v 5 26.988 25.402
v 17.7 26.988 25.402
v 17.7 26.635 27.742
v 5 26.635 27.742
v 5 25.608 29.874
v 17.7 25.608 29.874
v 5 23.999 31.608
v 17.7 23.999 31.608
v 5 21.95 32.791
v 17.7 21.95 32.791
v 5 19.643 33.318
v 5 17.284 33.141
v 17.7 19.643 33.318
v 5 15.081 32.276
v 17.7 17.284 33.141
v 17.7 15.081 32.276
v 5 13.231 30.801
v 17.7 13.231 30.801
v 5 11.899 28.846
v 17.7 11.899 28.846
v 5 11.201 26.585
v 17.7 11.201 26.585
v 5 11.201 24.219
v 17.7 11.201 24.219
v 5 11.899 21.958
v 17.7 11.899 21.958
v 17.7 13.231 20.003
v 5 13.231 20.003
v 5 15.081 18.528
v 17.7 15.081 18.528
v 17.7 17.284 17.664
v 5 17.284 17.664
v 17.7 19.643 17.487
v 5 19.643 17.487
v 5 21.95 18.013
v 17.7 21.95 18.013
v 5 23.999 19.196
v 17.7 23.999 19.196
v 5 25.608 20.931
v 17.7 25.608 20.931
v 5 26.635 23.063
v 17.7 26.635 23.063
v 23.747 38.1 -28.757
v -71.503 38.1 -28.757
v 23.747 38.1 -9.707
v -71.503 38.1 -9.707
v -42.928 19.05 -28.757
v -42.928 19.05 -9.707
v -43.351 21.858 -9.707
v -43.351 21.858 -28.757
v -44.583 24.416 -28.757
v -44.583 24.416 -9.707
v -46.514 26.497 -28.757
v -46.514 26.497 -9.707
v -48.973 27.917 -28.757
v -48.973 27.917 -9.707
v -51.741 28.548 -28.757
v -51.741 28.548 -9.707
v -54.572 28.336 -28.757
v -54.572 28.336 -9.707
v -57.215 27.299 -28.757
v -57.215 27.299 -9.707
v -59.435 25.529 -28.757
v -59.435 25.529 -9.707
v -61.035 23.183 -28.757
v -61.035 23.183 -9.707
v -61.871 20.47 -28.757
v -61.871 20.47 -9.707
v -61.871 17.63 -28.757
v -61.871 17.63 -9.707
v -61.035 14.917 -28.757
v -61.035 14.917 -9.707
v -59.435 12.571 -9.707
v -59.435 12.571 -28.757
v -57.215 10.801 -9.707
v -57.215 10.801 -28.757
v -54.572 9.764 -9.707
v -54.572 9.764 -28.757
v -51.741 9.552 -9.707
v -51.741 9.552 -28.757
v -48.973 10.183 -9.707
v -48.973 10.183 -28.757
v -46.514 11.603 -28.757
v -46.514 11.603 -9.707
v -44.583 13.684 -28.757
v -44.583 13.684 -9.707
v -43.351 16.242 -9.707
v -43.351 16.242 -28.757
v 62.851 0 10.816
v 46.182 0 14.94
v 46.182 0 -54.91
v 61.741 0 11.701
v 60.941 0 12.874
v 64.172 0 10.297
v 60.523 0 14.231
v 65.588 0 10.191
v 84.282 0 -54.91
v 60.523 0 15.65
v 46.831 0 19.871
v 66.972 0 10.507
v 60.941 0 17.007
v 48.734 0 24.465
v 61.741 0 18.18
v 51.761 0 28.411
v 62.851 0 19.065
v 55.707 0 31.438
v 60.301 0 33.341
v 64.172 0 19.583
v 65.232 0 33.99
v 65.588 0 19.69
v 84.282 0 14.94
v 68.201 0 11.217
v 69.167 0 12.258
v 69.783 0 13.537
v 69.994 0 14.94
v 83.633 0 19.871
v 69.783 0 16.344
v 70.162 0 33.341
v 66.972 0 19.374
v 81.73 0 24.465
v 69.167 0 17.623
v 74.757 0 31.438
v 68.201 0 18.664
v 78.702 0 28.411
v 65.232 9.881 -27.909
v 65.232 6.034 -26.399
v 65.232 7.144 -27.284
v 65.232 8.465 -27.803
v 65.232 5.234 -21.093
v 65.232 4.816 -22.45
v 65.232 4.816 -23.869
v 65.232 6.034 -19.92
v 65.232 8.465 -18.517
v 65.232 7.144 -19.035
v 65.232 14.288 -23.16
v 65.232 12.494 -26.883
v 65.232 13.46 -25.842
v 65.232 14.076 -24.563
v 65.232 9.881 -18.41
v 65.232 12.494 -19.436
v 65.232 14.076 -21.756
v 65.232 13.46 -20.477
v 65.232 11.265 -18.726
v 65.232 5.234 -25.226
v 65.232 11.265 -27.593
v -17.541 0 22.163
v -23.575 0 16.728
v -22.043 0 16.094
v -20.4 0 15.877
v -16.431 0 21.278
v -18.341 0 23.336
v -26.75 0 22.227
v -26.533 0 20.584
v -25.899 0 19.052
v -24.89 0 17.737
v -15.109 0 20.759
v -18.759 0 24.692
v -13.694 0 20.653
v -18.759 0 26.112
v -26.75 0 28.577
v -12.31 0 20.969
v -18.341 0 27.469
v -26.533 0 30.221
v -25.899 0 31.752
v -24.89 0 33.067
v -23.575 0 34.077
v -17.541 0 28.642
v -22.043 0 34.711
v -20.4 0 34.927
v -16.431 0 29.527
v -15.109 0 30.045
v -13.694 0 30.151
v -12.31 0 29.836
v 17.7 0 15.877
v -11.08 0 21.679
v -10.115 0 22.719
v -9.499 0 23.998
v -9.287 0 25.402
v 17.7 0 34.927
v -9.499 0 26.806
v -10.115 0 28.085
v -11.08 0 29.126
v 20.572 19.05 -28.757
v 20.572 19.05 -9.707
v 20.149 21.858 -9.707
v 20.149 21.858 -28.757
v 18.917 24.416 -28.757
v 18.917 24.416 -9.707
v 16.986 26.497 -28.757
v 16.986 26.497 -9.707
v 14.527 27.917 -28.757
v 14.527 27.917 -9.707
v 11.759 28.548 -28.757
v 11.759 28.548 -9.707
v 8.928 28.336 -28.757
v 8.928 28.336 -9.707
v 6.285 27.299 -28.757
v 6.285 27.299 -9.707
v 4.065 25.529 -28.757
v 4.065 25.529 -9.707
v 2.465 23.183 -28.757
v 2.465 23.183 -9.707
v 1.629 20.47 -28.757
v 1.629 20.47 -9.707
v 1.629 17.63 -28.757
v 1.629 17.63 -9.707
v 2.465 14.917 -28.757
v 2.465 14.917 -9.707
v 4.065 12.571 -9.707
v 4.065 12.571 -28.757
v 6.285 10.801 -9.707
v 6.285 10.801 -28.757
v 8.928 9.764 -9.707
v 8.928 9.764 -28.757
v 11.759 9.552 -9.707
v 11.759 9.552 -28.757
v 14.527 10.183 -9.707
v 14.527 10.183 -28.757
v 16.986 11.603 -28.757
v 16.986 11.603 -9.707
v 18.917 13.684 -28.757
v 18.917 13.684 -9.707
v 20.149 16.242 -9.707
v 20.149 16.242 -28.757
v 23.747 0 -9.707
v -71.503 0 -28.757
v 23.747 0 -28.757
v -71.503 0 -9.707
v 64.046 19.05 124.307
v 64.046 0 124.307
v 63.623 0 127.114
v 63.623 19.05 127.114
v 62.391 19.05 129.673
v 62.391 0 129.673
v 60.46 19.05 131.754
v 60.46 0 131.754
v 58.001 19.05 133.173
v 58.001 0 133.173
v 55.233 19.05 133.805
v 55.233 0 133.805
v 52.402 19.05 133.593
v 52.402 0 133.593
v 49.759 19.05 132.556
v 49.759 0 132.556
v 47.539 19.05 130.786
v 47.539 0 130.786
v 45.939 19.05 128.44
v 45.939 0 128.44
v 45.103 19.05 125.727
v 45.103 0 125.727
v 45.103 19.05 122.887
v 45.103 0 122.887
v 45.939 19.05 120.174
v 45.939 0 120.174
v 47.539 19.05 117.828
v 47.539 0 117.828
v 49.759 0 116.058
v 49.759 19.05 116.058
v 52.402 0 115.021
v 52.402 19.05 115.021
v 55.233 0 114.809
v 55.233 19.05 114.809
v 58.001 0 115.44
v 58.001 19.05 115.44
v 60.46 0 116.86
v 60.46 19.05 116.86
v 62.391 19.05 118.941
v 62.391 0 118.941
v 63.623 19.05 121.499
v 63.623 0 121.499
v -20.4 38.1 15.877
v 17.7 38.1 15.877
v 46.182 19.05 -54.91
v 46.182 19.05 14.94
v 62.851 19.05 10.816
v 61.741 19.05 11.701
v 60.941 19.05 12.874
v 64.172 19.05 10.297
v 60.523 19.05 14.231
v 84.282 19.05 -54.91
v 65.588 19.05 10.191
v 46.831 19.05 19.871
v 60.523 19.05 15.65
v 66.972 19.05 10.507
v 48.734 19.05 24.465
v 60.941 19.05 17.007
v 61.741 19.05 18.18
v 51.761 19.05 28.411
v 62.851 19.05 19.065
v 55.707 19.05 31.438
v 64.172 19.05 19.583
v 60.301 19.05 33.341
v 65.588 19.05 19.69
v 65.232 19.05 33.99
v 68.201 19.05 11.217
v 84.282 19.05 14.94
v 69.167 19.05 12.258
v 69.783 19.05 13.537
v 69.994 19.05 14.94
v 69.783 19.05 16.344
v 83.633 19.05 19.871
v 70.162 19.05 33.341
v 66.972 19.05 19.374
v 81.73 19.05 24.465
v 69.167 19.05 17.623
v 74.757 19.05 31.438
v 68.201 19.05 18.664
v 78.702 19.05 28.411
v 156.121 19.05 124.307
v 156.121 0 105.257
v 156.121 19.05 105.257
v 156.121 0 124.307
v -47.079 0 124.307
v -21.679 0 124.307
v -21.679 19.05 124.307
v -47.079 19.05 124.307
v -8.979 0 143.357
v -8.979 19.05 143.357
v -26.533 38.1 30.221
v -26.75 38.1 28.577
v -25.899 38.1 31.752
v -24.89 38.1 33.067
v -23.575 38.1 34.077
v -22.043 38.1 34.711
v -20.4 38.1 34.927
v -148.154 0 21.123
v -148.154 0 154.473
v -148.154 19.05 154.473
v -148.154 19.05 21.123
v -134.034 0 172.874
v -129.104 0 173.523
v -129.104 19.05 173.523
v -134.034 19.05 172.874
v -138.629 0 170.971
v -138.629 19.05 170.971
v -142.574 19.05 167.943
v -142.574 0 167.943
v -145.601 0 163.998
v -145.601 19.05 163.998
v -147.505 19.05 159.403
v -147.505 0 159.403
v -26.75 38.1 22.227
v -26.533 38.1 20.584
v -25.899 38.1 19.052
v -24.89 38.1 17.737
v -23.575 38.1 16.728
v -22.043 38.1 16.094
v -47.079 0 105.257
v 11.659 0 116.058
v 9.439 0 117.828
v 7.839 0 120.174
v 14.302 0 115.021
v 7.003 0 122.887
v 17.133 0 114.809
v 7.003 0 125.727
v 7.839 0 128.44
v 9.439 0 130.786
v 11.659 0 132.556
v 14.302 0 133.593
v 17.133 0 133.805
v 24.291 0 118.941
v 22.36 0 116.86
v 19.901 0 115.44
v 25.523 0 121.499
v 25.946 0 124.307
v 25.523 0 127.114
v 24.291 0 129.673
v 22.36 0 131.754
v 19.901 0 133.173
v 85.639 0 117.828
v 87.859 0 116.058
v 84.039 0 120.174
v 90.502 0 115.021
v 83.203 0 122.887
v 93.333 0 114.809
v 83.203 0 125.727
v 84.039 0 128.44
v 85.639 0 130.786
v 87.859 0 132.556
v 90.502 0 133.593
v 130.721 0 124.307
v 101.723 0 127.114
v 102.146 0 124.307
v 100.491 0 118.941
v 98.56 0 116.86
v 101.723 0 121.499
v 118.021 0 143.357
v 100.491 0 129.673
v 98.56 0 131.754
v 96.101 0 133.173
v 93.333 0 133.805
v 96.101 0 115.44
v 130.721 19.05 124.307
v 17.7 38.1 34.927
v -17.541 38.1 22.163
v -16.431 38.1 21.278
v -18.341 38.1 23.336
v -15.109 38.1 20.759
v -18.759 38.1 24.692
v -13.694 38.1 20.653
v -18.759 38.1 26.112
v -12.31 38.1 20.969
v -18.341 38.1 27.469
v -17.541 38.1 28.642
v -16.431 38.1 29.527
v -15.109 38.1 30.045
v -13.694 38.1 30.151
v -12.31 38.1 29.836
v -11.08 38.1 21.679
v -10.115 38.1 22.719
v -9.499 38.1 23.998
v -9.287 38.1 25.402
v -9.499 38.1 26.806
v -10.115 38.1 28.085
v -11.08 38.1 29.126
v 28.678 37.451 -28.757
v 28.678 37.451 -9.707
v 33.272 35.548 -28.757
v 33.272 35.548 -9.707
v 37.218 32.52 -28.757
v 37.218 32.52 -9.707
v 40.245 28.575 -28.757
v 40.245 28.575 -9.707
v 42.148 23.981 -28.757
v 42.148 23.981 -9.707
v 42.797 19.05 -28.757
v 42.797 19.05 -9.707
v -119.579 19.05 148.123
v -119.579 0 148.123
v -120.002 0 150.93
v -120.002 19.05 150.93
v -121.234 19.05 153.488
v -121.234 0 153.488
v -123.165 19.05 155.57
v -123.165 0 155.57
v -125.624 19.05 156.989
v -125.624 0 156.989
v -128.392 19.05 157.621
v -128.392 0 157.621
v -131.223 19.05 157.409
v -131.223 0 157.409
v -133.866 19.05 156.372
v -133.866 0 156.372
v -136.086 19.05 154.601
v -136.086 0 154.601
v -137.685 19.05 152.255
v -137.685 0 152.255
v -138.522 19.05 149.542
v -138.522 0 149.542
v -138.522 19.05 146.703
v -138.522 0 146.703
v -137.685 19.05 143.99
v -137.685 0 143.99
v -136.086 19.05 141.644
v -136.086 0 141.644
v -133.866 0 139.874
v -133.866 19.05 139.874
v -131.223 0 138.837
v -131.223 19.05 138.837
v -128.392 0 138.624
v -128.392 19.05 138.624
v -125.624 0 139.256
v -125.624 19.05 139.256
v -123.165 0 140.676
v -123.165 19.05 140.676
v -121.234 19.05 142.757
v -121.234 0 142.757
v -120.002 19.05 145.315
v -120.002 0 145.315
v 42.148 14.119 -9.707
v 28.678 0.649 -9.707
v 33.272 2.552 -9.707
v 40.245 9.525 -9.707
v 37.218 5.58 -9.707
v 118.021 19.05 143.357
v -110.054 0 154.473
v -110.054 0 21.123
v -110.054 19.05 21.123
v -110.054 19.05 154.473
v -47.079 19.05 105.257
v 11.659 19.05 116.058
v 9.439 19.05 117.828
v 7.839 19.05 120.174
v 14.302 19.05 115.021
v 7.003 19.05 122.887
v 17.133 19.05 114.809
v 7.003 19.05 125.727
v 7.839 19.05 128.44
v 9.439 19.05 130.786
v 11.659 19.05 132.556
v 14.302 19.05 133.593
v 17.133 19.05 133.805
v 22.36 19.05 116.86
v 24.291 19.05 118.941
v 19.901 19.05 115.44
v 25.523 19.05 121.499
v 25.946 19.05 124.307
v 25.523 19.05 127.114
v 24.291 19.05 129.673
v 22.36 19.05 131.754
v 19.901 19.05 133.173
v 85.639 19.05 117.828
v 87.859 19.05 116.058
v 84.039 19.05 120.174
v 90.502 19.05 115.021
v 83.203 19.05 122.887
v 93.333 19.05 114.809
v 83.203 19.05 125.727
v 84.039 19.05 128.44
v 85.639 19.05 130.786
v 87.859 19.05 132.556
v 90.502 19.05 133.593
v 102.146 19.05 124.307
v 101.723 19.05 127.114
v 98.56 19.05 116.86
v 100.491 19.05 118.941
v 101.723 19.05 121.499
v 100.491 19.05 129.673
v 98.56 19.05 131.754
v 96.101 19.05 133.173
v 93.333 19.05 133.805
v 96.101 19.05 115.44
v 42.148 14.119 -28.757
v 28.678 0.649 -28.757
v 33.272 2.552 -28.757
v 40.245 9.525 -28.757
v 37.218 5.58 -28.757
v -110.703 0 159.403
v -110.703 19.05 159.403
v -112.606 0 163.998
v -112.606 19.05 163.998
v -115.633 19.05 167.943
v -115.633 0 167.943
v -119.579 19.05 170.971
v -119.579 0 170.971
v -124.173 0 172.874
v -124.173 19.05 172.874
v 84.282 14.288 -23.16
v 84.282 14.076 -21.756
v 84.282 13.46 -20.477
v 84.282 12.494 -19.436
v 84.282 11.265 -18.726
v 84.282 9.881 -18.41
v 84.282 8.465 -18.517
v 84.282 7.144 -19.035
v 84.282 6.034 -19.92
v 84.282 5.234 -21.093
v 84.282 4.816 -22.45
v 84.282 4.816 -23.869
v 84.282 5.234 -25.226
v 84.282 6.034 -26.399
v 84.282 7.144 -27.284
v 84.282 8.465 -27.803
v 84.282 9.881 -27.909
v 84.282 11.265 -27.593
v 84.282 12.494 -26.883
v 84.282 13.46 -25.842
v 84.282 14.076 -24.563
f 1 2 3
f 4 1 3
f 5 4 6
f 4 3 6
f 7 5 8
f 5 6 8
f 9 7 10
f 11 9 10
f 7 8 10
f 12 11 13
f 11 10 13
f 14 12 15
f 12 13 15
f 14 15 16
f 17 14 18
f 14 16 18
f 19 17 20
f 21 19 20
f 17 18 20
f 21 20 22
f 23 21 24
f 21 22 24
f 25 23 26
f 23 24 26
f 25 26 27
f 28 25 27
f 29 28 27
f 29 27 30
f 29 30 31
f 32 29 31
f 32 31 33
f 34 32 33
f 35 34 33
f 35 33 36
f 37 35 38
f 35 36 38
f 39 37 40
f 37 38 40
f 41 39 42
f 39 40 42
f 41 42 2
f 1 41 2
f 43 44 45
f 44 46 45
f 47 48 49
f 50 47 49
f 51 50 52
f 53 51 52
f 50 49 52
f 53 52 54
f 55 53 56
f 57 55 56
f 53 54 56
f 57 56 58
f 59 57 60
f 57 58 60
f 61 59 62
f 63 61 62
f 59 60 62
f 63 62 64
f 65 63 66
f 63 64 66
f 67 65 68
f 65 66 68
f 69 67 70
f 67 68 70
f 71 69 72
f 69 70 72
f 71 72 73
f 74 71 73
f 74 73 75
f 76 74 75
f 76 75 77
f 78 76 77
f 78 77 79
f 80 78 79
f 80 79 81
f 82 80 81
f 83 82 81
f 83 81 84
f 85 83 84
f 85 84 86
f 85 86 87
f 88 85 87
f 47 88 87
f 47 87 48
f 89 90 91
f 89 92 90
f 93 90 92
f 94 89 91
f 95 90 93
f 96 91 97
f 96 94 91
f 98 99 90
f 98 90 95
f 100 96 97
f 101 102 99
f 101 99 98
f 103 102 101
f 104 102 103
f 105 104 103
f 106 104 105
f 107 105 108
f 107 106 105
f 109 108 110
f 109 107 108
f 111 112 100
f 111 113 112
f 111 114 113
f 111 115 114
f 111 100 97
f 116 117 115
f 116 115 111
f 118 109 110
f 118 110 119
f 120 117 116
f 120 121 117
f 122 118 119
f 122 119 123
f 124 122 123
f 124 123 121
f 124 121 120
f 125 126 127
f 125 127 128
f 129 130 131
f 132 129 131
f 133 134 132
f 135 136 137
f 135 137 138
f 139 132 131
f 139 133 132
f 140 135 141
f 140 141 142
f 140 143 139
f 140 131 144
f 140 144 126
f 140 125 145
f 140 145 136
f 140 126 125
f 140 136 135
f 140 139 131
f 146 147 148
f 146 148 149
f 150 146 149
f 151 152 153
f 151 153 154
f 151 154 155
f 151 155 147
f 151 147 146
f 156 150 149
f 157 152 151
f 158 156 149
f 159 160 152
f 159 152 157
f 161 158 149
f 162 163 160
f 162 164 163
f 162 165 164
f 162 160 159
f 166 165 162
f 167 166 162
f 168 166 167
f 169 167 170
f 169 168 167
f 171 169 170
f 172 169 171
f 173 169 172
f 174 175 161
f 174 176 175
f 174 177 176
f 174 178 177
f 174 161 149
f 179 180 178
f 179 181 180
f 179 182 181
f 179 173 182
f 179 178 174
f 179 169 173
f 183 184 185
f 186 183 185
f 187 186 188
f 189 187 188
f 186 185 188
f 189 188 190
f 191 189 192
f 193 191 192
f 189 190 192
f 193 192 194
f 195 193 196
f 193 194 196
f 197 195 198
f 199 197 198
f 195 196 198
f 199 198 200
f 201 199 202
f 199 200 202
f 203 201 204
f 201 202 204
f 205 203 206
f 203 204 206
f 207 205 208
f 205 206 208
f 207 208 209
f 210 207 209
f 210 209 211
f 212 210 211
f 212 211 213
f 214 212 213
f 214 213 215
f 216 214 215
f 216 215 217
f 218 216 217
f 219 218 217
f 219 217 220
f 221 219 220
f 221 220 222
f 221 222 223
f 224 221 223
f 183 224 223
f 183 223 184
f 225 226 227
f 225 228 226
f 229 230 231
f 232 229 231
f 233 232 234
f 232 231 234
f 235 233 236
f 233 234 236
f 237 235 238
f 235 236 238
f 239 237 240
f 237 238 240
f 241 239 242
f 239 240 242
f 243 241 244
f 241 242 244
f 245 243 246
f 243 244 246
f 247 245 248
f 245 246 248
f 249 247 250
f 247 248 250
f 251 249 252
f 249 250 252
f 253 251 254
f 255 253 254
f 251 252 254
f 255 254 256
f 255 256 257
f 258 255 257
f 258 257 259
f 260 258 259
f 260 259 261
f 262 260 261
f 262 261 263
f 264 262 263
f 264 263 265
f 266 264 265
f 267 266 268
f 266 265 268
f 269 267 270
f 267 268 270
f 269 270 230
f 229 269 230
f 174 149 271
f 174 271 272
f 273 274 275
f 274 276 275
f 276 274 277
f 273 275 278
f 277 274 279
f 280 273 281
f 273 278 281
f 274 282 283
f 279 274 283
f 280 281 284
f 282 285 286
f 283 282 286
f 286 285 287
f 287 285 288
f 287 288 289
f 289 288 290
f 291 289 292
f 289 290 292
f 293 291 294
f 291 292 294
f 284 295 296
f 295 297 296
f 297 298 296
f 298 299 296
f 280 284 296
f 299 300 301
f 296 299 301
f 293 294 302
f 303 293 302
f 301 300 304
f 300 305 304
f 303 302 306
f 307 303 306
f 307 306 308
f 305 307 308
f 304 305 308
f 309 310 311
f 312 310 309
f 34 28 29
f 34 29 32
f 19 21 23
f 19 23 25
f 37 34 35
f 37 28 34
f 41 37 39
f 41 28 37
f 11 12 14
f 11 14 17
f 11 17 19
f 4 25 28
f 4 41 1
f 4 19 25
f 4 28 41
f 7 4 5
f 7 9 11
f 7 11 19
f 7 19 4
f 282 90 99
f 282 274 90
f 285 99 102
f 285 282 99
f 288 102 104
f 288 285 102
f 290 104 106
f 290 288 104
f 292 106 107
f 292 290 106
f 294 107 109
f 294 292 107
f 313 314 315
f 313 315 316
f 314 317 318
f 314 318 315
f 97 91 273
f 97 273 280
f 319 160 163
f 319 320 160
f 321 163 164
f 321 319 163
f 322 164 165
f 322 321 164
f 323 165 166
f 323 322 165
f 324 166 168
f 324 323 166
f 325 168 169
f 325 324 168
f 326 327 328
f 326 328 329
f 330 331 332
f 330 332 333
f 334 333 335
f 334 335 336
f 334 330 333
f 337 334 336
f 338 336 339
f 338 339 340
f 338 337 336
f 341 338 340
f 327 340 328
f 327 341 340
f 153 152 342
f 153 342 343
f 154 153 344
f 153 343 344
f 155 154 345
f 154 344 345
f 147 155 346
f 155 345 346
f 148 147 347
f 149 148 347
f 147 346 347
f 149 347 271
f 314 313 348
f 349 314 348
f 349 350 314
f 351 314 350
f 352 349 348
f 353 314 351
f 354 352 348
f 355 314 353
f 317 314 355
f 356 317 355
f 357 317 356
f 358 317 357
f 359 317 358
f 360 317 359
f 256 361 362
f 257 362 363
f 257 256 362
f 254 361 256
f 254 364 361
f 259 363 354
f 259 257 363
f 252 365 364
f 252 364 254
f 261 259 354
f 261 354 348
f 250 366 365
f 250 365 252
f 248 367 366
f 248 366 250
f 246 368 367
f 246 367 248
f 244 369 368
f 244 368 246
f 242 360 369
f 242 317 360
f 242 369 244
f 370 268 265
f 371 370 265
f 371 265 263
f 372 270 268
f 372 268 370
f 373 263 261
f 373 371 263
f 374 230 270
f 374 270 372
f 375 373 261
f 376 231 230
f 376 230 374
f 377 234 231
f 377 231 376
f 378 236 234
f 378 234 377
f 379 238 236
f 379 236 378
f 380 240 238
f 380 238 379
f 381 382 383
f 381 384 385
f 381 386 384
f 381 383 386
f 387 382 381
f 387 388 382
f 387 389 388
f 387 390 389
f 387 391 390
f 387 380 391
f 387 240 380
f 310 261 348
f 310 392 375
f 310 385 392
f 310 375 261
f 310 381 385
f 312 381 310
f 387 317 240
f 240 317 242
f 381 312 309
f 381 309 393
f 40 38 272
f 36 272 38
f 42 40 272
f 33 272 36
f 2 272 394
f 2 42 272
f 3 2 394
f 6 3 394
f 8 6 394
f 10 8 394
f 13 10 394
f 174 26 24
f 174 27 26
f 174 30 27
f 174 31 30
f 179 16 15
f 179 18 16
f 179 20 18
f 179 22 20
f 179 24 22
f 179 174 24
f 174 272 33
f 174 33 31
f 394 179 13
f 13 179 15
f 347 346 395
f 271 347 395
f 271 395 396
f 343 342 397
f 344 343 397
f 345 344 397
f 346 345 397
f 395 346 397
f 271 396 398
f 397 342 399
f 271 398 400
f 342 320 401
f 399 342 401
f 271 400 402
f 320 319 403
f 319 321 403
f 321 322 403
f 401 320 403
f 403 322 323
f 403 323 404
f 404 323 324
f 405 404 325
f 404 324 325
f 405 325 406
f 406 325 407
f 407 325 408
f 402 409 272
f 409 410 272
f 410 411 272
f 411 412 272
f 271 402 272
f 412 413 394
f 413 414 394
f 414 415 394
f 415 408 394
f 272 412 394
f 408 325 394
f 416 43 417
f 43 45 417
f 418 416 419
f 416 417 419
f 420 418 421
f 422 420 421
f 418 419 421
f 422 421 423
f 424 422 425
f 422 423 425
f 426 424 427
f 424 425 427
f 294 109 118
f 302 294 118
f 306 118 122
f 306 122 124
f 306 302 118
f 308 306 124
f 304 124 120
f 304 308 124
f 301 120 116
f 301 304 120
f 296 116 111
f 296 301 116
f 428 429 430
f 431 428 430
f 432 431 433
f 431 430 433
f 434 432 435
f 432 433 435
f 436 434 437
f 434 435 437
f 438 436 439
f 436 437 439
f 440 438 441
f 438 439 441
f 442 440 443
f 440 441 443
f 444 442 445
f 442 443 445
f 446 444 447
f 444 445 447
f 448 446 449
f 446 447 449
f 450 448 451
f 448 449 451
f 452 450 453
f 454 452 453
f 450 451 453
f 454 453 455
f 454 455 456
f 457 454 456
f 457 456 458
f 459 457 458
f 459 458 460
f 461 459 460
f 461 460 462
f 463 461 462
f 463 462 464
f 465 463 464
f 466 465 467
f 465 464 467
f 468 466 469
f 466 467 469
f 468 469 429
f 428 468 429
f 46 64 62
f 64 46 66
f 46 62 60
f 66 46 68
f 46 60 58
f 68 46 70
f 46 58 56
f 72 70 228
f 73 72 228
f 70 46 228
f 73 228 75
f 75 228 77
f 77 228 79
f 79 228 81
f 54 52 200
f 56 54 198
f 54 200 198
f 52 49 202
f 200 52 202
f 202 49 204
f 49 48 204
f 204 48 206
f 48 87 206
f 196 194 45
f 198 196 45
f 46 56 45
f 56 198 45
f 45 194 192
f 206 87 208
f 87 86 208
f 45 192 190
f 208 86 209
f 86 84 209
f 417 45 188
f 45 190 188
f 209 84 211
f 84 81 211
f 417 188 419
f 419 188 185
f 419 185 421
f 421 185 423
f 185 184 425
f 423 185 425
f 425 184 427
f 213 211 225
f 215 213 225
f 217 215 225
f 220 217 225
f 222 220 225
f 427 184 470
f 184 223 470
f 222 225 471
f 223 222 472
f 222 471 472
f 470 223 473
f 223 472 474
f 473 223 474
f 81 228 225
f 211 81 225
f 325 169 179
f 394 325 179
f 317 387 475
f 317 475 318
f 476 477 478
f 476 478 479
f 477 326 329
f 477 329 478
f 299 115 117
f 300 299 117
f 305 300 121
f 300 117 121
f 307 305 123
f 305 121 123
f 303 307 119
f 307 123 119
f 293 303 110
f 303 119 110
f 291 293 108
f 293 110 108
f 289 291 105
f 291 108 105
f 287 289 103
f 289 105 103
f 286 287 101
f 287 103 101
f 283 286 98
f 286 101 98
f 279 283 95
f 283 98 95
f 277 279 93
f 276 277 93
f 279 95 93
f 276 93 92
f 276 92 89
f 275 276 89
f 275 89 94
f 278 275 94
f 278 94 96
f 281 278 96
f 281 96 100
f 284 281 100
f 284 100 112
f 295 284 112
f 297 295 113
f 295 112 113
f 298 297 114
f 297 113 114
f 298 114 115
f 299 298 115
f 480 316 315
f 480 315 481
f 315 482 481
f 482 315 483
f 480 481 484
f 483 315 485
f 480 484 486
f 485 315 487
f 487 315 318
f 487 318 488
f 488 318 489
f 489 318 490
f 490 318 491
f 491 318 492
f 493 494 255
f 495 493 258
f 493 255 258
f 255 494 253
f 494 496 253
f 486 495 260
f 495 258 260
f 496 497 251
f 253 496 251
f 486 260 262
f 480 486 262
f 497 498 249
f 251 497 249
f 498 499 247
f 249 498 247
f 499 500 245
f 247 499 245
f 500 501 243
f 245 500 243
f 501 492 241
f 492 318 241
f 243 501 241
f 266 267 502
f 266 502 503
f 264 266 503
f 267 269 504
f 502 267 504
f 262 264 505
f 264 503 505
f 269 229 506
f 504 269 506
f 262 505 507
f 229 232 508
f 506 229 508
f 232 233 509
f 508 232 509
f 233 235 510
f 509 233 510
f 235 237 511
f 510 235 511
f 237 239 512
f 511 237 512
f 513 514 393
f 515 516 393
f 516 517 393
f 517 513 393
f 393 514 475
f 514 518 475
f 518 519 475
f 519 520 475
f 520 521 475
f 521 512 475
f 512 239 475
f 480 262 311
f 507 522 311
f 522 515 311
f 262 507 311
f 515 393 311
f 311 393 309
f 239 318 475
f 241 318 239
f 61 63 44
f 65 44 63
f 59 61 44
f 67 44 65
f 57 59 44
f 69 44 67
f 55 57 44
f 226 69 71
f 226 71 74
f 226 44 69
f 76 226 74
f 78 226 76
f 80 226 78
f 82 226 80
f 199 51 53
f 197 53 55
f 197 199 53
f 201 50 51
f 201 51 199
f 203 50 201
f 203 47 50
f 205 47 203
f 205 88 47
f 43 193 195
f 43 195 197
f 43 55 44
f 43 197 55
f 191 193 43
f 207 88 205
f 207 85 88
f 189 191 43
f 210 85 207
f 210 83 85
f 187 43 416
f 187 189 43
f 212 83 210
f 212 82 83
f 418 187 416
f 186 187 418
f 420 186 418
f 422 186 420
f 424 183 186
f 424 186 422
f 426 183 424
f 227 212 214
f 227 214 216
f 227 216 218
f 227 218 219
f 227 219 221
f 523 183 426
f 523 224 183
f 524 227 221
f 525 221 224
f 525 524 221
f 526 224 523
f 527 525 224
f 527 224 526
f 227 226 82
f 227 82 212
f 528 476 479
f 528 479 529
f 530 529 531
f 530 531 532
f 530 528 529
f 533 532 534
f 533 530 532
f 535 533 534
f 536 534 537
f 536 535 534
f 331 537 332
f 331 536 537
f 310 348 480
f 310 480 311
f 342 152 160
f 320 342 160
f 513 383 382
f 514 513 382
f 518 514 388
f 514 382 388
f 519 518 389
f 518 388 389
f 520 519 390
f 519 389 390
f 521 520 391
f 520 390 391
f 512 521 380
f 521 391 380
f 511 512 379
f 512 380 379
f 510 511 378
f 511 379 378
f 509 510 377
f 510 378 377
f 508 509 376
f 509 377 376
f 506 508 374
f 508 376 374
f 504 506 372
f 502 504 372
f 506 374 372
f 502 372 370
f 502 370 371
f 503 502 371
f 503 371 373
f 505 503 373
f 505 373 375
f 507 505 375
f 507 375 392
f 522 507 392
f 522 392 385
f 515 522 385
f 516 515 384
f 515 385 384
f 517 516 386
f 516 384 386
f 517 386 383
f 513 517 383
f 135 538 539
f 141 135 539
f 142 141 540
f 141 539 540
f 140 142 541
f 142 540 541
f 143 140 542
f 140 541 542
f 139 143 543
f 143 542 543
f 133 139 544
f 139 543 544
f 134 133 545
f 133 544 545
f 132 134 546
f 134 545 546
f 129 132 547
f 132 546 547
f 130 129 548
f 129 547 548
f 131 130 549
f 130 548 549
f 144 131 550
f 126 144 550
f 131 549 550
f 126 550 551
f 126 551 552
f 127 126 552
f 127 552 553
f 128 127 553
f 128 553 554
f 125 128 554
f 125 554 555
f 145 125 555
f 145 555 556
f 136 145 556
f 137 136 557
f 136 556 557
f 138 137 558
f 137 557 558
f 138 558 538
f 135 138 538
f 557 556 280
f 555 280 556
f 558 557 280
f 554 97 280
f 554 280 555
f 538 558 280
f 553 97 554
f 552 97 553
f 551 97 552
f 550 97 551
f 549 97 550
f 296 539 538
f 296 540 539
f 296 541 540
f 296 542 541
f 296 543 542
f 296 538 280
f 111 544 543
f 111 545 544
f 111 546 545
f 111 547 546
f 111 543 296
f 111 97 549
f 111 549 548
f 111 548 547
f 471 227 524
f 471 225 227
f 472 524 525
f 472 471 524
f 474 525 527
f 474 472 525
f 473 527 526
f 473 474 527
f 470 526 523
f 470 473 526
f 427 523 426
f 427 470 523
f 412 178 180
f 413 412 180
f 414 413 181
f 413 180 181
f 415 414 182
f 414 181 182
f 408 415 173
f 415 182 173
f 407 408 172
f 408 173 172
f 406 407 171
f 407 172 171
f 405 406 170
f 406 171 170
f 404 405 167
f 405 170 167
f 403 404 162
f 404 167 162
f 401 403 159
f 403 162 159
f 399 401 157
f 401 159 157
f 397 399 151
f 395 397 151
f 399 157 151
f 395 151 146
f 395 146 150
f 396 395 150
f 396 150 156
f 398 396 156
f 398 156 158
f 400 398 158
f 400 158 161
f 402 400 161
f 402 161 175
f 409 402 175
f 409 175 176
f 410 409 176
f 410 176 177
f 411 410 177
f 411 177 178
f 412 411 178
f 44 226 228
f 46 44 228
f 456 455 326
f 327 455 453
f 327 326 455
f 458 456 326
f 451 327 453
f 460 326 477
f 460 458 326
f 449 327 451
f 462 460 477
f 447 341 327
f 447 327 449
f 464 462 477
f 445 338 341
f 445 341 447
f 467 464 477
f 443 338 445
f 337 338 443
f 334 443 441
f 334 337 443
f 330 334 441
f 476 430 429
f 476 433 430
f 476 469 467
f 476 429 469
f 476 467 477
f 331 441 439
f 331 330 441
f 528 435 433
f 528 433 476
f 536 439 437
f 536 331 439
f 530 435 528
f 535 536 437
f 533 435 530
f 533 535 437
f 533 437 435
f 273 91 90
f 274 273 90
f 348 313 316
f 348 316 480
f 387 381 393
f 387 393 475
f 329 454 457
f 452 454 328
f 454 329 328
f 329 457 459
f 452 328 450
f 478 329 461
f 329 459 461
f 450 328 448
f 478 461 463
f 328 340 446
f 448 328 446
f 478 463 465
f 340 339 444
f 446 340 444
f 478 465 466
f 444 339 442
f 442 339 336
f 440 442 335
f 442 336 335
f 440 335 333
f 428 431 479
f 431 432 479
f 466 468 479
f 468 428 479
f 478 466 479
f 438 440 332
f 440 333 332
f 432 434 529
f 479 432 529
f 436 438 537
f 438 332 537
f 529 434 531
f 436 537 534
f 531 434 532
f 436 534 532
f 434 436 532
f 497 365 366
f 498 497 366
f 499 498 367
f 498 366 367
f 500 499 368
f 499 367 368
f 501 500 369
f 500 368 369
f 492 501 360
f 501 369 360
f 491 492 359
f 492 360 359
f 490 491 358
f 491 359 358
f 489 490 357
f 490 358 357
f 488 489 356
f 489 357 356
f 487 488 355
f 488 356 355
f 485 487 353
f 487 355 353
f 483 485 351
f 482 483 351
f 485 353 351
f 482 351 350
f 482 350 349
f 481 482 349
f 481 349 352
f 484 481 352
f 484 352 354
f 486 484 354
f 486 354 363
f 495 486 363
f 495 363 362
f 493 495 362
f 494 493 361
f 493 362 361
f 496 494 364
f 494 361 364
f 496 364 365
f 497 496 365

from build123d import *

# Parameters (mm, degrees)
F0_W      = 44.45
F0_H      = 19.05
F1_DEPTH  = 38.1
F2_R      = 4.7625
F3_DEPTH  = 118.58277
F4_R      = 7.9375
F5_DEPTH  = 12.7
F6_R      = 6.35
F7_W      = 38.1
F7_H      = 88.9
F7_R      = 4.7625
F8_DEPTH  = 19.05
F9_R      = 4.7625
F10_DEPTH = 19.05
F11_R     = 19.04999
F12_W     = 114.3
F12_H     = 19.05
F13_DEPTH = 38.1
F14_R     = 9.525
F15_DEPTH = 43.37852
F16_R     = 19.04999
F17_R     = 9.525
F18_DEPTH = 19.05
F19_R     = 9.525
F20_DEPTH = 19.05


# Not quite as in the source:
# - a fillet or chamfer is up to 0.001 mm smaller than in the source, because OpenCascade refuses the exact size


with BuildPart() as f1:
    # F0 (on Front) → F1 (new body)
    with BuildSketch(Plane.XZ):
        with Locations((-4.5246369214, 25.4022409208)):
            Rectangle(F0_W, F0_H)
    extrude(amount=-F1_DEPTH)

    # F2 (on face) → F3 (cut)
    with BuildSketch(Plane.XZ):
        with Locations((-14.0496369214, 25.4022409208)):
            Circle(F2_R)
    extrude(amount=-F3_DEPTH, mode=Mode.SUBTRACT)

    # F4 (on face) → F5 (cut)
    with BuildSketch(Plane.YZ.offset(17.7003630786)):
        with Locations((19.05, 25.4022409208)):
            Circle(F4_R)
    extrude(amount=-F5_DEPTH, mode=Mode.SUBTRACT)

    # F6
    f6_edges = [f1.edges().sort_by_distance(p)[0] for p in [
        (-26.749637, 19.05, 34.927241),
        (-26.749637, 19.05, 15.877241),
    ]]
    fillet(f6_edges, radius=F6_R)


with BuildPart() as f8:
    # F7 (on Front) → F8 (new body)
    with BuildSketch(Plane.XZ):
        with Locations((65.2318205684, -10.4596508645)):
            Rectangle(F7_W, F7_H)
        with Locations((65.2318205684, 14.9403491355)):
            Circle(F7_R, mode=Mode.SUBTRACT)
    extrude(amount=-F8_DEPTH)

    # F9 (on face) → F10 (cut)
    with BuildSketch(Plane.YZ.offset(84.2818205684)):
        with Locations((9.525, -23.1596508645)):
            Circle(F9_R)
    extrude(amount=-F10_DEPTH, mode=Mode.SUBTRACT)

    # F11 (radius 19.05 in the source; OpenCascade refuses exactly that, so slightly less here)
    f11_edges = [f8.edges().sort_by_distance(p)[0] for p in [
        (84.281821, 9.525, 33.990349),
        (46.181821, 9.525, 33.990349),
    ]]
    fillet(f11_edges, radius=F11_R)


with BuildPart() as f13:
    # F12 (on Front) → F13 (new body)
    with BuildSketch(Plane.XZ):
        with Locations((-14.3527926165, -19.2319881171)):
            Rectangle(F12_W, F12_H)
    extrude(amount=-F13_DEPTH)

    # F14 (on face) → F15 (cut)
    with BuildSketch(Plane.XY.offset(-9.7069881171)):
        with Locations((-52.4527926165, 19.05)):
            Circle(F14_R)
        with Locations((11.0472073835, 19.05)):
            Circle(F14_R)
    extrude(amount=-F15_DEPTH, mode=Mode.SUBTRACT)

    # F16 (radius 19.05 in the source; OpenCascade refuses exactly that, so slightly less here)
    f16_edges = [f13.edges().sort_by_distance(p)[0] for p in [
        (42.797207, 38.1, -19.231988),
        (42.797207, 0, -19.231988),
    ]]
    fillet(f16_edges, radius=F16_R)


with BuildPart() as f18:
    # F17 (on Front) → F18 (new body)
    with BuildSketch(Plane.XZ):
        with BuildLine():
            Line((-148.1536233306, 154.4727383056), (-148.1536233306, 21.1227383056))
            Line((-148.1536233306, 21.1227383056), (-110.0536233306, 21.1227383056))
            Line((-110.0536233306, 21.1227383056), (-110.0536233306, 154.4727383056))
            ThreePointArc((-110.0536233306, 154.4727383056), (-115.633239149, 167.9431224872), (-129.1036233306, 173.5227383056))
            ThreePointArc((-129.1036233306, 173.5227383056), (-142.5740075122, 167.9431224872), (-148.1536233306, 154.4727383056))
        make_face()
        with Locations((-129.1036233306, 148.1227383056)):
            Circle(F17_R, mode=Mode.SUBTRACT)
    extrude(amount=-F18_DEPTH)


with BuildPart() as f20:
    # F19 (on Front) → F20 (new body)
    with BuildSketch(Plane.XZ):
        Polygon((118.0211378485, 143.3568834615), (-8.9788621515, 143.3568834615), (-21.6788621515, 124.3068834615), (-47.0788621515, 124.3068834615), (-47.0788621515, 105.2568834615), (156.1211378485, 105.2568834615), (156.1211378485, 124.3068834615), (130.7211378485, 124.3068834615), align=None)
        with Locations((16.4211378485, 124.3068834615)):
            Circle(F19_R, mode=Mode.SUBTRACT)
        with Locations((54.5211378485, 124.3068834615)):
            Circle(F19_R, mode=Mode.SUBTRACT)
        with Locations((92.6211378485, 124.3068834615)):
            Circle(F19_R, mode=Mode.SUBTRACT)
    extrude(amount=-F20_DEPTH)


solid = Compound([f1.part, f8.part, f13.part, f18.part, f20.part])
